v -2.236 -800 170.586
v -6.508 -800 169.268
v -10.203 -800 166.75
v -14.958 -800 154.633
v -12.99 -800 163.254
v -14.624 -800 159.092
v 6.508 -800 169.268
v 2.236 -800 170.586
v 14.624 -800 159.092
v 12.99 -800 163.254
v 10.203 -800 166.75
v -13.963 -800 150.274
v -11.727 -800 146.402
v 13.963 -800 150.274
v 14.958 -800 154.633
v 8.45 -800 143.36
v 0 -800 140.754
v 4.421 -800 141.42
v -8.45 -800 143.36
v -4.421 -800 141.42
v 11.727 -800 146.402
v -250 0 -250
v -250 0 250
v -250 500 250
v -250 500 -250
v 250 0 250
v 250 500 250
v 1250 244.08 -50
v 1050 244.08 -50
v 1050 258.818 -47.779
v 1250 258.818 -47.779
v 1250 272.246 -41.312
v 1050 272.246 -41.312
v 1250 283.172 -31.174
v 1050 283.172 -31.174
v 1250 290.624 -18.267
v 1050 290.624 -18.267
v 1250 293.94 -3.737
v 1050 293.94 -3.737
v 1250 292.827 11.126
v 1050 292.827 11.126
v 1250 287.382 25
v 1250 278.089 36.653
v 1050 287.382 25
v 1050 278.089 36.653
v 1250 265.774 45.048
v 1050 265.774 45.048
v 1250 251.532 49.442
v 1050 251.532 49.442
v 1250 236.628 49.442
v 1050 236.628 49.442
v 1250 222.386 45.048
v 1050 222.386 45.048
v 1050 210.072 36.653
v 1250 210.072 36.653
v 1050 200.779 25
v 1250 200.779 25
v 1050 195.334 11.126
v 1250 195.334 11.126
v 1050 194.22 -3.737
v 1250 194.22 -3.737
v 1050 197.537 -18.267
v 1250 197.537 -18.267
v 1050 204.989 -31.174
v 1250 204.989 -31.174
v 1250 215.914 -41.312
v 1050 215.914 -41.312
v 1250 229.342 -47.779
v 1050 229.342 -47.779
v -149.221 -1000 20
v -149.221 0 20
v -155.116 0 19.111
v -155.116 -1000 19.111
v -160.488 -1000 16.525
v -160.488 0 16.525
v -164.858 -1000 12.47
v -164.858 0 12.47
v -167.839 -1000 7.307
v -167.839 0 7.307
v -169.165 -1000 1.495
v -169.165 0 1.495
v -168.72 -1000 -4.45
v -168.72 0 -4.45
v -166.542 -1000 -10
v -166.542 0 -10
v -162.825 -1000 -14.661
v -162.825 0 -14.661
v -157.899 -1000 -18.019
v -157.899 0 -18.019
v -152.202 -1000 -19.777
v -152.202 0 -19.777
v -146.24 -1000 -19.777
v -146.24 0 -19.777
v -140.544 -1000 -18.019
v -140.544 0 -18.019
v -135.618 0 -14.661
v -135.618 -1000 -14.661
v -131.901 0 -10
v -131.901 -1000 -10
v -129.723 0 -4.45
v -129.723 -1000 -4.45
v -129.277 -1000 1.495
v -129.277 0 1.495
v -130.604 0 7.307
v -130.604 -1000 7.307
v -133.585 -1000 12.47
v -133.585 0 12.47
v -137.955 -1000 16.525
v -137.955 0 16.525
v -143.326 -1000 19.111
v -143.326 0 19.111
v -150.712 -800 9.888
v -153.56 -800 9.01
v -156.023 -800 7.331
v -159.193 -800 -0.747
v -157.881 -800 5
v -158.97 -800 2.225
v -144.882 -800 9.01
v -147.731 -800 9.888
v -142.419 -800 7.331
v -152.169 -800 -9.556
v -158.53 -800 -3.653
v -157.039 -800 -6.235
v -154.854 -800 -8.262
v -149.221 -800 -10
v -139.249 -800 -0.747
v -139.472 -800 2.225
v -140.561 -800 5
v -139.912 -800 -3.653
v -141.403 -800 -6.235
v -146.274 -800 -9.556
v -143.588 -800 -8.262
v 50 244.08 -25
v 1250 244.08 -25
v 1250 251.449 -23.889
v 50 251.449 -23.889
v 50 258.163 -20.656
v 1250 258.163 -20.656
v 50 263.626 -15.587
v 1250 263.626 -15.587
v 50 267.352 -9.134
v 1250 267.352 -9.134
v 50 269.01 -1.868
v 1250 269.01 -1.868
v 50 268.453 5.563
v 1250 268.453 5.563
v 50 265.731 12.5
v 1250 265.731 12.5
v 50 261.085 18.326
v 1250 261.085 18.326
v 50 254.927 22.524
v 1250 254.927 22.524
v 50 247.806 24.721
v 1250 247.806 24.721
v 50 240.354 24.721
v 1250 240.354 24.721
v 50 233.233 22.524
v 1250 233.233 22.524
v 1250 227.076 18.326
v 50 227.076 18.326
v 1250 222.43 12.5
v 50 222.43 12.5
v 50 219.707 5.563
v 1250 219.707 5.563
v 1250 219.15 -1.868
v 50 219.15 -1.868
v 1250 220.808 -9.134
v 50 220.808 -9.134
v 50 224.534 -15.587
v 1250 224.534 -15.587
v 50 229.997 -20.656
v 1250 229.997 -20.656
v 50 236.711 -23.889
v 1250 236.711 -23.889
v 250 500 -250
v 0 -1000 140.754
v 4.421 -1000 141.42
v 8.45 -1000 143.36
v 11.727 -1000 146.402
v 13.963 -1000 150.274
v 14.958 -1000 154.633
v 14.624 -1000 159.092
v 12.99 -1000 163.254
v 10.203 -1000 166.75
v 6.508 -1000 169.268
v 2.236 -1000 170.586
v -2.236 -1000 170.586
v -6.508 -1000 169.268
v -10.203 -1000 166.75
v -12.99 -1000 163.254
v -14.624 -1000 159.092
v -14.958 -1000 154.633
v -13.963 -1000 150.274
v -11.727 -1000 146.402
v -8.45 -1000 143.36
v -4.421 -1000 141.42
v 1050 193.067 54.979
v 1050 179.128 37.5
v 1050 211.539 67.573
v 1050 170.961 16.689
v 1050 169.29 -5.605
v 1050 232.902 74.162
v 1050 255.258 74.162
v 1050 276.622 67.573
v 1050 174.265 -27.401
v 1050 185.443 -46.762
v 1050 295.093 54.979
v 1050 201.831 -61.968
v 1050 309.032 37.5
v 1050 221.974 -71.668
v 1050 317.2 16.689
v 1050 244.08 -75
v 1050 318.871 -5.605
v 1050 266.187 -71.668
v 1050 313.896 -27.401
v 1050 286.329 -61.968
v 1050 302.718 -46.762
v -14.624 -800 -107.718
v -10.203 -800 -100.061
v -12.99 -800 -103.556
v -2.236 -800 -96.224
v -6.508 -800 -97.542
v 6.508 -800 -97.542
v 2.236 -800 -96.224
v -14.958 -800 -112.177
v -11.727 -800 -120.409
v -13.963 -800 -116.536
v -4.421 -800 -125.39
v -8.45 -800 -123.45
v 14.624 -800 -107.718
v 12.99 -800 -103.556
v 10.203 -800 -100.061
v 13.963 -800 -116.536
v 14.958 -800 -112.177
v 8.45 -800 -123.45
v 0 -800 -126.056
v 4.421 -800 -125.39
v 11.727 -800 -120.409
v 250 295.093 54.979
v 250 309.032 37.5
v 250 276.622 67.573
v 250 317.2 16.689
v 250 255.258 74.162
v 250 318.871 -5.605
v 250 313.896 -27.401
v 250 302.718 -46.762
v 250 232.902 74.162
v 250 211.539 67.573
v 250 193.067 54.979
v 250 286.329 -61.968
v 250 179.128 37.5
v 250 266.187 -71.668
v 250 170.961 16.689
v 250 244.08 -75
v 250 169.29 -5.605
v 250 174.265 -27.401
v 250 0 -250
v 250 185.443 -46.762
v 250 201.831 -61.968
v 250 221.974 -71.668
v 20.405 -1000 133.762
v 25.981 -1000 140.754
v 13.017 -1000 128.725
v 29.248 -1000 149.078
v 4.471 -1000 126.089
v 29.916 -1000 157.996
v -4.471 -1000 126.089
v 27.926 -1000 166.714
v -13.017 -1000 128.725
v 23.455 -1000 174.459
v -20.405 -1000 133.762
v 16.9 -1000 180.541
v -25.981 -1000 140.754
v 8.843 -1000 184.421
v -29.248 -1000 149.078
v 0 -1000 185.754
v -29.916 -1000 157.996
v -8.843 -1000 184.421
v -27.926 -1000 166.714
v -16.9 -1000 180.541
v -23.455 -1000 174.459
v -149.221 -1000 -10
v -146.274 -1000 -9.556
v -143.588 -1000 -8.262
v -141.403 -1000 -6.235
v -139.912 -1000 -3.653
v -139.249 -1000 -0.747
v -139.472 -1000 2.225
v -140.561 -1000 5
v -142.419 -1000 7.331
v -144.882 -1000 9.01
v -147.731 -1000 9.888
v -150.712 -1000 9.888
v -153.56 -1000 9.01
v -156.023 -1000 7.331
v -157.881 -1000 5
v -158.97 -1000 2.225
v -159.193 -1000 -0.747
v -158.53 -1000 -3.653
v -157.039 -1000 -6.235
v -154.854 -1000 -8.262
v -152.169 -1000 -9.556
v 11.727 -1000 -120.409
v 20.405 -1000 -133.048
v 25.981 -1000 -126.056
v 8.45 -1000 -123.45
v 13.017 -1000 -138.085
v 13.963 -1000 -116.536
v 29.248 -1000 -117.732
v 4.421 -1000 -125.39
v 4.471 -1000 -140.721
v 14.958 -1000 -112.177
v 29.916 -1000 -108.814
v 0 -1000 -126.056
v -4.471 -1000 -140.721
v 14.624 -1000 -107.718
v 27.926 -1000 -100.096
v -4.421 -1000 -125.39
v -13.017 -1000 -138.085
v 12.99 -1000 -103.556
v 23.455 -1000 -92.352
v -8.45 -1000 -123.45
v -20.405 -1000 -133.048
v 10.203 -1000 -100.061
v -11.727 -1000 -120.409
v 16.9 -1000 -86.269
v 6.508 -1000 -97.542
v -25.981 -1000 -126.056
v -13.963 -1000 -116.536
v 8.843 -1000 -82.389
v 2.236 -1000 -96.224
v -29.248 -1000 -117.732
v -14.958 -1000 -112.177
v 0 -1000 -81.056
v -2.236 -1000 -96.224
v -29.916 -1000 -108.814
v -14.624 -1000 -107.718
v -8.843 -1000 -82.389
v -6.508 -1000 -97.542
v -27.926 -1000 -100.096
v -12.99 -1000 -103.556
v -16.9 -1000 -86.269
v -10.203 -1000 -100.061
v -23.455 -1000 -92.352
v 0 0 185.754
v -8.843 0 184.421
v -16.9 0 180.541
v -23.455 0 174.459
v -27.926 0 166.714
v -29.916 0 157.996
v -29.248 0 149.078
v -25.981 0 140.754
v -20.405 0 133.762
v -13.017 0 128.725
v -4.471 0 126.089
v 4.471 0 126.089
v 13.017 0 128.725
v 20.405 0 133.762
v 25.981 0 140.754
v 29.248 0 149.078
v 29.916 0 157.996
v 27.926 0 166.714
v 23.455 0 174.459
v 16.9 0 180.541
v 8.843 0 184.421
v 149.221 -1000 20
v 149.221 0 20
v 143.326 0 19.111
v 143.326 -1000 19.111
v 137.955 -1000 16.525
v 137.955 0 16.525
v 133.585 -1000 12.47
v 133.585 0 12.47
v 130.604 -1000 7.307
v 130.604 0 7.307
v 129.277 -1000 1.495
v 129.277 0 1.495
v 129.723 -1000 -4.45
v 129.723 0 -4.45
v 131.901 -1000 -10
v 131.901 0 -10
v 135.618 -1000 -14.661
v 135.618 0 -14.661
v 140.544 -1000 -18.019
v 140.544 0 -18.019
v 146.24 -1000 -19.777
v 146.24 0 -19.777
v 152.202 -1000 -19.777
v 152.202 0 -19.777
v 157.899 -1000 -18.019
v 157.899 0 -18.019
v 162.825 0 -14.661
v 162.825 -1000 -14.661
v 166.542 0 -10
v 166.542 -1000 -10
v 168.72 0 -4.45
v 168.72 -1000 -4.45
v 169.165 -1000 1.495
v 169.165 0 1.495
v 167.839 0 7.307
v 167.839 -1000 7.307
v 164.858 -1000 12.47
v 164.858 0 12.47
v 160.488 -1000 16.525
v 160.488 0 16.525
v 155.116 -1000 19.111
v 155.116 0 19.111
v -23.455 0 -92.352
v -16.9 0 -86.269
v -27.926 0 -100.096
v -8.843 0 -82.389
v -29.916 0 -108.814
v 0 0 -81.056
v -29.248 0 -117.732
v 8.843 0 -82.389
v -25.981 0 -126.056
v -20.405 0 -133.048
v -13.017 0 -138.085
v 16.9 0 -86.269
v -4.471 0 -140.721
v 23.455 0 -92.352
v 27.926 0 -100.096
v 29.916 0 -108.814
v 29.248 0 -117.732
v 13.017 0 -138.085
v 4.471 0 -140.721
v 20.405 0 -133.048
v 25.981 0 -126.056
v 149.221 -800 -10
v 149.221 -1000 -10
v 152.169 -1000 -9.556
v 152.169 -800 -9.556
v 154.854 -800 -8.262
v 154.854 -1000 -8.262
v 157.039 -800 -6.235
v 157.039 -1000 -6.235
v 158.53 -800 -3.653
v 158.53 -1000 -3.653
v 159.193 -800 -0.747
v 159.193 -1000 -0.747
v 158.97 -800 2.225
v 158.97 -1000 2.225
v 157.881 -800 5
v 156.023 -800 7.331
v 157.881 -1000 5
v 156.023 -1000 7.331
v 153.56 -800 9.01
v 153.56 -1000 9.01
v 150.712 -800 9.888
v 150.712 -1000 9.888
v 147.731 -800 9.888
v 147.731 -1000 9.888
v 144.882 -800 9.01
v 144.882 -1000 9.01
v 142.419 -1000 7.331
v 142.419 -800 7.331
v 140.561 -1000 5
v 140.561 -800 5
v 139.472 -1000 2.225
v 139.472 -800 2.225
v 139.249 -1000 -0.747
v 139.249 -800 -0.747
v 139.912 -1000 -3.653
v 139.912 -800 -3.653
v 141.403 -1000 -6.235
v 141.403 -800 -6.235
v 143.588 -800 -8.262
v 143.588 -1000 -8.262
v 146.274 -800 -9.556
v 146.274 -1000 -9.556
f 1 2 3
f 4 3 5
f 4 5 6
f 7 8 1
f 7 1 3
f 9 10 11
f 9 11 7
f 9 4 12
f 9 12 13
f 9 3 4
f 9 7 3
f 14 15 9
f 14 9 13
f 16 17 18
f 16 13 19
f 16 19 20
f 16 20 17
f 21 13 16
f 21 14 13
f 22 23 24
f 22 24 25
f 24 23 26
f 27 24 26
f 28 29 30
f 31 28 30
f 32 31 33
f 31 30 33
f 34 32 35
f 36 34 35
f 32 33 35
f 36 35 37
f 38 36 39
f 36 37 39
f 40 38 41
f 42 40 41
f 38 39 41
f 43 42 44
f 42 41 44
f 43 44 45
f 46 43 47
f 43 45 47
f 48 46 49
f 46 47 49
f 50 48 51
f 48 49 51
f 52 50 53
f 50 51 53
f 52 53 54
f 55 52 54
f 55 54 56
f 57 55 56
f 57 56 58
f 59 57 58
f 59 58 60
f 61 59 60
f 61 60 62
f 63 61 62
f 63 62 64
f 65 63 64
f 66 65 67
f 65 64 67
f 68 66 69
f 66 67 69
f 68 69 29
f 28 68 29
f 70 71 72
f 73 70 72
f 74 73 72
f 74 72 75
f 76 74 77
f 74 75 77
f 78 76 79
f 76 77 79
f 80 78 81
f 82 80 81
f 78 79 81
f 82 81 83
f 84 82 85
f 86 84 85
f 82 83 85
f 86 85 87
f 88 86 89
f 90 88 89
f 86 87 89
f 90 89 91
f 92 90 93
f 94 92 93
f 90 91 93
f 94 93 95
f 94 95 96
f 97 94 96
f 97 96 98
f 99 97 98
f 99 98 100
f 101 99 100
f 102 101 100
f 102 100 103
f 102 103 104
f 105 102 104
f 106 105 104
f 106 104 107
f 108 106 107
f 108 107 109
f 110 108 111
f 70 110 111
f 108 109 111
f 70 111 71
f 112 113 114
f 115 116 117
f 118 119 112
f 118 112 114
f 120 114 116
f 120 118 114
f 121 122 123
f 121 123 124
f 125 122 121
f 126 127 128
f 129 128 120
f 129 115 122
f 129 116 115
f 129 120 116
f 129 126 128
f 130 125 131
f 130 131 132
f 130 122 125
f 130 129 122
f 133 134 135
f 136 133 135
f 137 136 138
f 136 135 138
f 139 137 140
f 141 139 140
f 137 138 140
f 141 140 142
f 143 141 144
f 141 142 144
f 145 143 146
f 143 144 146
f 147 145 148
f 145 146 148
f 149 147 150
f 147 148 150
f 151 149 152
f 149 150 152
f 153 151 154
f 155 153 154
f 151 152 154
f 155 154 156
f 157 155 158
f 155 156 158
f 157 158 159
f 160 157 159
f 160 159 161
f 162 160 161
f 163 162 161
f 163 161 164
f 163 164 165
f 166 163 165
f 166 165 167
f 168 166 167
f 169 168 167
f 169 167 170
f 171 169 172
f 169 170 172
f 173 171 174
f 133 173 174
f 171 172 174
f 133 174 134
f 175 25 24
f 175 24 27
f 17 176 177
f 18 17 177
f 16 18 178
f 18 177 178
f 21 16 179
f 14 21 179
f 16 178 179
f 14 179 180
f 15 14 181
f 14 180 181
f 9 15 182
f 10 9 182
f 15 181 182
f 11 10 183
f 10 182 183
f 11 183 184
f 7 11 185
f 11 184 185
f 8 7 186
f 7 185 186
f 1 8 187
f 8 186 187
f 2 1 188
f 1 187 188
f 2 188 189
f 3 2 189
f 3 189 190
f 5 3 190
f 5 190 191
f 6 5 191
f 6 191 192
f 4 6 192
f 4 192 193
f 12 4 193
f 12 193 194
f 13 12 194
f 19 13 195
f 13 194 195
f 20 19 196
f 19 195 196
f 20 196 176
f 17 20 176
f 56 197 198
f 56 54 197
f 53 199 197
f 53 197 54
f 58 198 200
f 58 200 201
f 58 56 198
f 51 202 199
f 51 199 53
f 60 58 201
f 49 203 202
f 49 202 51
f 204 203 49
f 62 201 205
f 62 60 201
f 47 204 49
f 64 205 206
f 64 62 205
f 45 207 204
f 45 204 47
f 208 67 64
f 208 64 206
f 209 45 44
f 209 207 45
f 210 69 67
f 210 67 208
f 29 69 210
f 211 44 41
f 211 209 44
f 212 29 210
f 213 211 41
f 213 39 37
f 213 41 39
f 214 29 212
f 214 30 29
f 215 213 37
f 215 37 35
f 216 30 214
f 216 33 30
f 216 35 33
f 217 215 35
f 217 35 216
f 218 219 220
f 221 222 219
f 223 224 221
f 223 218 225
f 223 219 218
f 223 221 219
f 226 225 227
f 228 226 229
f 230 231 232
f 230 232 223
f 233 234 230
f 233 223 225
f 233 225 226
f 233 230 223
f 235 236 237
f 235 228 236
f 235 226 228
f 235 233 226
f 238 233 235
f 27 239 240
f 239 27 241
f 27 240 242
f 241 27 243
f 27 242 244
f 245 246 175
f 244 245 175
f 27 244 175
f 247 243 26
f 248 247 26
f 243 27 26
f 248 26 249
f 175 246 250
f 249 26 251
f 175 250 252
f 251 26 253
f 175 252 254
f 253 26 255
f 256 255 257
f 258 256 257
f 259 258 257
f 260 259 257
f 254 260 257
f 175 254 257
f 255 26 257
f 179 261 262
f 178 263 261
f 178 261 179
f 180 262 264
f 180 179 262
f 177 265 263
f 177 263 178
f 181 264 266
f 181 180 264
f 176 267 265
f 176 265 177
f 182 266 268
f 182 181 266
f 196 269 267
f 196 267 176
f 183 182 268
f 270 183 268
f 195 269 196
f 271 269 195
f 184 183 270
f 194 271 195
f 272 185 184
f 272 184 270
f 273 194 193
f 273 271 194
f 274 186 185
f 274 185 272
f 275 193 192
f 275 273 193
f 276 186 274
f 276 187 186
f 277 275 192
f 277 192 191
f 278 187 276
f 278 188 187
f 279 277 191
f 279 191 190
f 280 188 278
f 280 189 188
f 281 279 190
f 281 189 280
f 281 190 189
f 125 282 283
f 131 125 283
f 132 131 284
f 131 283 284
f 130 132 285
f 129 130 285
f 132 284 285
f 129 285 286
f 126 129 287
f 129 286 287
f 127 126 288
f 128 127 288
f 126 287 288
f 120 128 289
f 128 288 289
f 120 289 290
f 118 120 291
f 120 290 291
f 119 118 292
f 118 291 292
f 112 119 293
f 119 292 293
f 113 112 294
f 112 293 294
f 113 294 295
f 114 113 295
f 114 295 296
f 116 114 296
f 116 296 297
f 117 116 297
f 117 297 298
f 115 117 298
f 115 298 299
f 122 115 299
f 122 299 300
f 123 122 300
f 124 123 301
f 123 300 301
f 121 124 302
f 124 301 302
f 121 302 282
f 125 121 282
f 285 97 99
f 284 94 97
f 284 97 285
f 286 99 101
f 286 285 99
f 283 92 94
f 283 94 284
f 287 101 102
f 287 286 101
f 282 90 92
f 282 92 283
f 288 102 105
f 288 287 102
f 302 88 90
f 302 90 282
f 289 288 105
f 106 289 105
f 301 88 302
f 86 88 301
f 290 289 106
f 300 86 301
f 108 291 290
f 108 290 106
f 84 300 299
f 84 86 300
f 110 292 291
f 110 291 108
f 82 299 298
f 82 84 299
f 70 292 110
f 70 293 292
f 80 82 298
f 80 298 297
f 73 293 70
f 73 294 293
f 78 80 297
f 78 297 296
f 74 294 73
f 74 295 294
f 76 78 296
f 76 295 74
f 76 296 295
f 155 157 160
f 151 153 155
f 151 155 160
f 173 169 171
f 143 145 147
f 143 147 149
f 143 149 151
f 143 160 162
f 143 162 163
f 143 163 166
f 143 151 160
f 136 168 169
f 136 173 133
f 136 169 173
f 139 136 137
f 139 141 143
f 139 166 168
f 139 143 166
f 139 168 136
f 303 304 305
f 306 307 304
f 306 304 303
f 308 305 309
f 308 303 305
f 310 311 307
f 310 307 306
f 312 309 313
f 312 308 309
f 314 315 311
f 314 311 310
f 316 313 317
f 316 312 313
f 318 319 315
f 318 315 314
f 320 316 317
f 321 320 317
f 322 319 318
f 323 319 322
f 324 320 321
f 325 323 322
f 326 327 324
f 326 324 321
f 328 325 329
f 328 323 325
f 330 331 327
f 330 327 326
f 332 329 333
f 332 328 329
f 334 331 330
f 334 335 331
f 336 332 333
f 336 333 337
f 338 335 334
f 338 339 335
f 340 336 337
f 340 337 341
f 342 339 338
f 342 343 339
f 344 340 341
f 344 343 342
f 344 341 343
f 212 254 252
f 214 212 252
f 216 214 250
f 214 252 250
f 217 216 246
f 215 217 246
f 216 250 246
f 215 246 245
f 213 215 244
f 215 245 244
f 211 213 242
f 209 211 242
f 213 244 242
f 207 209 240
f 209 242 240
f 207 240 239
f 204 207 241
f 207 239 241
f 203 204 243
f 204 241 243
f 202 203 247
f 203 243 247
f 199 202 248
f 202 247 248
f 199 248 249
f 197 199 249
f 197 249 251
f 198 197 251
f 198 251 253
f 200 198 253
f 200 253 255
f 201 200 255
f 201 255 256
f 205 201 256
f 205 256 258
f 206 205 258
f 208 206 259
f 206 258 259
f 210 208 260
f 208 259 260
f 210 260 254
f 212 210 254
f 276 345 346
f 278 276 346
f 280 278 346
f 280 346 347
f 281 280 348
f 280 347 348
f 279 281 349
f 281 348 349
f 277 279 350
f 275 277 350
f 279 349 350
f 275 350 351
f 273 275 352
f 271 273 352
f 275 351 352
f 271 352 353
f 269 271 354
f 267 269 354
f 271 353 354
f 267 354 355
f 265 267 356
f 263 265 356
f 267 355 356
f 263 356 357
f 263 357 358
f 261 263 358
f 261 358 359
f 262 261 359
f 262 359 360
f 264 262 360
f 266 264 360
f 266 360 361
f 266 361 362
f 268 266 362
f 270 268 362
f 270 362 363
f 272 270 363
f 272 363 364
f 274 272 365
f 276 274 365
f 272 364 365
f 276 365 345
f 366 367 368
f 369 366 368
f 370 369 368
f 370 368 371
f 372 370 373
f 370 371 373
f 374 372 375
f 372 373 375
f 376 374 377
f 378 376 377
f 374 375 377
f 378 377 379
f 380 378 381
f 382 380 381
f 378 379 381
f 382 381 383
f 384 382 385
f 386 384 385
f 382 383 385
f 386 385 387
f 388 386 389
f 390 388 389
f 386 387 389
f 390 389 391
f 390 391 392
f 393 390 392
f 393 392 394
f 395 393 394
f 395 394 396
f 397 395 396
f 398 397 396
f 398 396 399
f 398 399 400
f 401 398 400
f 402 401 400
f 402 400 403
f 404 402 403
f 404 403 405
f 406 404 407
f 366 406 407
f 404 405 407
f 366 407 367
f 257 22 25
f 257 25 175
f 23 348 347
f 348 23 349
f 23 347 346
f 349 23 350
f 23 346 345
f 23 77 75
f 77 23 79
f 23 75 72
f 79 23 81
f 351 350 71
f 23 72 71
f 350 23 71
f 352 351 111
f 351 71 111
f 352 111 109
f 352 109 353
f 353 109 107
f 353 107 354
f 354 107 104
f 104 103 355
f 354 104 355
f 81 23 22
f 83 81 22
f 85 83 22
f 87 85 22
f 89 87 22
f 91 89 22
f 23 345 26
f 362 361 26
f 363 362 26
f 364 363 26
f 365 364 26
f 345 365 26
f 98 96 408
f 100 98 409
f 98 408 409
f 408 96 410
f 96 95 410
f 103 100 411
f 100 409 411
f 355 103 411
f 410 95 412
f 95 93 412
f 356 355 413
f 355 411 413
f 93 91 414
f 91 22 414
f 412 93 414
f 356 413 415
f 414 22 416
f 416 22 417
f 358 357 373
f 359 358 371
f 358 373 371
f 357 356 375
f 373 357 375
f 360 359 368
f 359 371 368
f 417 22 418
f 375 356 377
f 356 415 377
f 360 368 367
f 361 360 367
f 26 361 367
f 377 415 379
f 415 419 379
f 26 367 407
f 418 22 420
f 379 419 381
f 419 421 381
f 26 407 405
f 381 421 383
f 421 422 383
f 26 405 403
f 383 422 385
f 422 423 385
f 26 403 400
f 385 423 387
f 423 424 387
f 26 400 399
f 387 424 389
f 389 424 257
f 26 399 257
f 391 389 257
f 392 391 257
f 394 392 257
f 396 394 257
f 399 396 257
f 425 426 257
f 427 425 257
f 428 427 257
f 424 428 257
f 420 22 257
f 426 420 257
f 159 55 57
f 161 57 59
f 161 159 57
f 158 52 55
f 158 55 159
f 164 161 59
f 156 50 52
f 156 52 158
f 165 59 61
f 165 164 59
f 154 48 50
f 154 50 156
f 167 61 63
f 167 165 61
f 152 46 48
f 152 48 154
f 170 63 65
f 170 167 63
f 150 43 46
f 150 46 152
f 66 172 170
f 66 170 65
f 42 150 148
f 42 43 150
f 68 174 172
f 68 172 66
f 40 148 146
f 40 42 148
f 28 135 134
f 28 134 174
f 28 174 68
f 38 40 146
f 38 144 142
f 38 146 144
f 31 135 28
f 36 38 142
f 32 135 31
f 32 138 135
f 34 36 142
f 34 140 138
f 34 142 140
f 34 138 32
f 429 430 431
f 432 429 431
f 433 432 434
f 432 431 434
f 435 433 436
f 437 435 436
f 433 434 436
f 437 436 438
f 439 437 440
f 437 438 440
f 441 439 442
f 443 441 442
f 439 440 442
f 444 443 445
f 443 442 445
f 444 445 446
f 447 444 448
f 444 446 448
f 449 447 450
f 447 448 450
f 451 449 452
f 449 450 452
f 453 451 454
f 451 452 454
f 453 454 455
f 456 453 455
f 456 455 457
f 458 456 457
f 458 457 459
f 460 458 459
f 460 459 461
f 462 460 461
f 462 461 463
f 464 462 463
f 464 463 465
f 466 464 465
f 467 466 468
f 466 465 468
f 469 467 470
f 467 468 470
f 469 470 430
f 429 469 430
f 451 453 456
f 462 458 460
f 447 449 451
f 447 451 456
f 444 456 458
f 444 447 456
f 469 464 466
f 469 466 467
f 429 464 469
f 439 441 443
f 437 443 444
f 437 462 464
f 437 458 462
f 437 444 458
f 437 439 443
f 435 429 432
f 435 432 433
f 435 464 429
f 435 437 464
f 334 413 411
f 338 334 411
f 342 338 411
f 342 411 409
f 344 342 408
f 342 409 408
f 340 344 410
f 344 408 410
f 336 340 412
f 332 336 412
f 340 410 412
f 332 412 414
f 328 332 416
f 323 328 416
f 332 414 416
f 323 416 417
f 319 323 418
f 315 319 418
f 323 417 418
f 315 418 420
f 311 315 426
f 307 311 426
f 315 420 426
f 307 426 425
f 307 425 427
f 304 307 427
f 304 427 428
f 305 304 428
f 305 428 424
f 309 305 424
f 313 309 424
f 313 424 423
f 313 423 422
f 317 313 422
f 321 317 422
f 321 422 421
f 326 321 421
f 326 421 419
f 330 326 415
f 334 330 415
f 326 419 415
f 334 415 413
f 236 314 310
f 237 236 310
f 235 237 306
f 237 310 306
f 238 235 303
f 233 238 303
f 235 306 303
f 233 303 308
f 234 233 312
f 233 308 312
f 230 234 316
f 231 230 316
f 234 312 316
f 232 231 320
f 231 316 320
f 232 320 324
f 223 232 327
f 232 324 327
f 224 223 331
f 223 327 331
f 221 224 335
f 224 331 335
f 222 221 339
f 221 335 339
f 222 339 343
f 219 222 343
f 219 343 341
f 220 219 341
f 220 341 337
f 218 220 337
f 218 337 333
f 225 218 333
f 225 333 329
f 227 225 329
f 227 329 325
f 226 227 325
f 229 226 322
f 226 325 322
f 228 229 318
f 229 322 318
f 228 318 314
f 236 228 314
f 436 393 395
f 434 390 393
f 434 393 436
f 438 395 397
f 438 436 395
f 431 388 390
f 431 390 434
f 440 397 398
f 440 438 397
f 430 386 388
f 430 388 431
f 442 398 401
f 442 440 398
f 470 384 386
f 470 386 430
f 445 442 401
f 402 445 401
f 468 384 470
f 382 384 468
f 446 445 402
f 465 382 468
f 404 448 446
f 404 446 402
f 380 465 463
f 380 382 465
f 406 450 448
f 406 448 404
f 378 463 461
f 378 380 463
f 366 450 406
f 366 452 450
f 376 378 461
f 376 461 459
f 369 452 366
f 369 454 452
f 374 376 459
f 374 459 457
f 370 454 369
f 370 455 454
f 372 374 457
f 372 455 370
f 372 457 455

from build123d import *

# Parameters (mm, degrees)
SKETCH1_W           = 500
SKETCH1_H           = 500
BOSS_EXTRUDE1_DEPTH = 500
SKETCH2_R           = 30
SKETCH2_R_2         = 20
BOSS_EXTRUDE2_DEPTH = 1000
SKETCH3_R           = 75
BOSS_EXTRUDE3_DEPTH = 800
SKETCH4_R           = 50
BOSS_EXTRUDE4_DEPTH = 200
SKETCH5_R           = 25
CUT_EXTRUDE1_DEPTH  = 1200
SKETCH6_R           = 15
SKETCH6_R_2         = 10
CUT_EXTRUDE2_DEPTH  = 200


with BuildPart() as part:
    # Sketch1 → Boss-Extrude1 (new body)
    with BuildSketch(Plane(origin=(0, 0, 0), x_dir=(1, 0, 0), z_dir=(0, 1, 0))):
        Rectangle(SKETCH1_W, SKETCH1_H)
    extrude(amount=BOSS_EXTRUDE1_DEPTH)

    # Sketch2 → Boss-Extrude2 (add)
    with BuildSketch(Plane.XZ):
        with Locations(Location((0, 155.7539011, 0), (0, 0, 90))):
            Circle(SKETCH2_R)
        with Locations(Location((-149.221176771, 0, 0), (0, 0, 90))):
            Circle(SKETCH2_R_2)
        with Locations(Location((149.221176771, 0, 0), (0, 0, 90))):
            Circle(SKETCH2_R_2)
        with Locations(Location((0, -111.056313588, 0), (0, 0, 90))):
            Circle(SKETCH2_R)
    extrude(amount=BOSS_EXTRUDE2_DEPTH)

    # Sketch3 → Boss-Extrude3 (add)
    with BuildSketch(Plane(origin=(250, 0, 0), x_dir=(0, 0, -1), z_dir=(1, 0, 0))):
        with Locations((0, 244.080255808)):
            Circle(SKETCH3_R)
    extrude(amount=BOSS_EXTRUDE3_DEPTH)

    # Sketch4 → Boss-Extrude4 (add)
    with BuildSketch(Plane(origin=(1050, 0, 0), x_dir=(0, 0, -1), z_dir=(1, 0, 0))):
        with Locations((0, 244.080255808)):
            Circle(SKETCH4_R)
    extrude(amount=BOSS_EXTRUDE4_DEPTH)

    # Sketch5 → Cut-Extrude1 (cut)
    with BuildSketch(Plane(origin=(1250, 0, 0), x_dir=(0, 0, -1), z_dir=(1, 0, 0))):
        with Locations((0, 244.080255808)):
            Circle(SKETCH5_R)
    extrude(amount=-CUT_EXTRUDE1_DEPTH, mode=Mode.SUBTRACT)

    # Sketch6 → Cut-Extrude2 (cut)
    with BuildSketch(Plane.XZ.offset(1000)):
        with Locations(Location((0, 155.7539011, 0), (0, 0, 270))):
            Circle(SKETCH6_R)
        with Locations(Location((149.221176771, 0, 0), (0, 0, 270))):
            Circle(SKETCH6_R_2)
        with Locations(Location((0, -111.056313588, 0), (0, 0, 270))):
            Circle(SKETCH6_R)
        with Locations(Location((-149.221176771, 0, 0), (0, 0, 270))):
            Circle(SKETCH6_R_2)
    extrude(amount=-CUT_EXTRUDE2_DEPTH, mode=Mode.SUBTRACT)


solid = part.part
